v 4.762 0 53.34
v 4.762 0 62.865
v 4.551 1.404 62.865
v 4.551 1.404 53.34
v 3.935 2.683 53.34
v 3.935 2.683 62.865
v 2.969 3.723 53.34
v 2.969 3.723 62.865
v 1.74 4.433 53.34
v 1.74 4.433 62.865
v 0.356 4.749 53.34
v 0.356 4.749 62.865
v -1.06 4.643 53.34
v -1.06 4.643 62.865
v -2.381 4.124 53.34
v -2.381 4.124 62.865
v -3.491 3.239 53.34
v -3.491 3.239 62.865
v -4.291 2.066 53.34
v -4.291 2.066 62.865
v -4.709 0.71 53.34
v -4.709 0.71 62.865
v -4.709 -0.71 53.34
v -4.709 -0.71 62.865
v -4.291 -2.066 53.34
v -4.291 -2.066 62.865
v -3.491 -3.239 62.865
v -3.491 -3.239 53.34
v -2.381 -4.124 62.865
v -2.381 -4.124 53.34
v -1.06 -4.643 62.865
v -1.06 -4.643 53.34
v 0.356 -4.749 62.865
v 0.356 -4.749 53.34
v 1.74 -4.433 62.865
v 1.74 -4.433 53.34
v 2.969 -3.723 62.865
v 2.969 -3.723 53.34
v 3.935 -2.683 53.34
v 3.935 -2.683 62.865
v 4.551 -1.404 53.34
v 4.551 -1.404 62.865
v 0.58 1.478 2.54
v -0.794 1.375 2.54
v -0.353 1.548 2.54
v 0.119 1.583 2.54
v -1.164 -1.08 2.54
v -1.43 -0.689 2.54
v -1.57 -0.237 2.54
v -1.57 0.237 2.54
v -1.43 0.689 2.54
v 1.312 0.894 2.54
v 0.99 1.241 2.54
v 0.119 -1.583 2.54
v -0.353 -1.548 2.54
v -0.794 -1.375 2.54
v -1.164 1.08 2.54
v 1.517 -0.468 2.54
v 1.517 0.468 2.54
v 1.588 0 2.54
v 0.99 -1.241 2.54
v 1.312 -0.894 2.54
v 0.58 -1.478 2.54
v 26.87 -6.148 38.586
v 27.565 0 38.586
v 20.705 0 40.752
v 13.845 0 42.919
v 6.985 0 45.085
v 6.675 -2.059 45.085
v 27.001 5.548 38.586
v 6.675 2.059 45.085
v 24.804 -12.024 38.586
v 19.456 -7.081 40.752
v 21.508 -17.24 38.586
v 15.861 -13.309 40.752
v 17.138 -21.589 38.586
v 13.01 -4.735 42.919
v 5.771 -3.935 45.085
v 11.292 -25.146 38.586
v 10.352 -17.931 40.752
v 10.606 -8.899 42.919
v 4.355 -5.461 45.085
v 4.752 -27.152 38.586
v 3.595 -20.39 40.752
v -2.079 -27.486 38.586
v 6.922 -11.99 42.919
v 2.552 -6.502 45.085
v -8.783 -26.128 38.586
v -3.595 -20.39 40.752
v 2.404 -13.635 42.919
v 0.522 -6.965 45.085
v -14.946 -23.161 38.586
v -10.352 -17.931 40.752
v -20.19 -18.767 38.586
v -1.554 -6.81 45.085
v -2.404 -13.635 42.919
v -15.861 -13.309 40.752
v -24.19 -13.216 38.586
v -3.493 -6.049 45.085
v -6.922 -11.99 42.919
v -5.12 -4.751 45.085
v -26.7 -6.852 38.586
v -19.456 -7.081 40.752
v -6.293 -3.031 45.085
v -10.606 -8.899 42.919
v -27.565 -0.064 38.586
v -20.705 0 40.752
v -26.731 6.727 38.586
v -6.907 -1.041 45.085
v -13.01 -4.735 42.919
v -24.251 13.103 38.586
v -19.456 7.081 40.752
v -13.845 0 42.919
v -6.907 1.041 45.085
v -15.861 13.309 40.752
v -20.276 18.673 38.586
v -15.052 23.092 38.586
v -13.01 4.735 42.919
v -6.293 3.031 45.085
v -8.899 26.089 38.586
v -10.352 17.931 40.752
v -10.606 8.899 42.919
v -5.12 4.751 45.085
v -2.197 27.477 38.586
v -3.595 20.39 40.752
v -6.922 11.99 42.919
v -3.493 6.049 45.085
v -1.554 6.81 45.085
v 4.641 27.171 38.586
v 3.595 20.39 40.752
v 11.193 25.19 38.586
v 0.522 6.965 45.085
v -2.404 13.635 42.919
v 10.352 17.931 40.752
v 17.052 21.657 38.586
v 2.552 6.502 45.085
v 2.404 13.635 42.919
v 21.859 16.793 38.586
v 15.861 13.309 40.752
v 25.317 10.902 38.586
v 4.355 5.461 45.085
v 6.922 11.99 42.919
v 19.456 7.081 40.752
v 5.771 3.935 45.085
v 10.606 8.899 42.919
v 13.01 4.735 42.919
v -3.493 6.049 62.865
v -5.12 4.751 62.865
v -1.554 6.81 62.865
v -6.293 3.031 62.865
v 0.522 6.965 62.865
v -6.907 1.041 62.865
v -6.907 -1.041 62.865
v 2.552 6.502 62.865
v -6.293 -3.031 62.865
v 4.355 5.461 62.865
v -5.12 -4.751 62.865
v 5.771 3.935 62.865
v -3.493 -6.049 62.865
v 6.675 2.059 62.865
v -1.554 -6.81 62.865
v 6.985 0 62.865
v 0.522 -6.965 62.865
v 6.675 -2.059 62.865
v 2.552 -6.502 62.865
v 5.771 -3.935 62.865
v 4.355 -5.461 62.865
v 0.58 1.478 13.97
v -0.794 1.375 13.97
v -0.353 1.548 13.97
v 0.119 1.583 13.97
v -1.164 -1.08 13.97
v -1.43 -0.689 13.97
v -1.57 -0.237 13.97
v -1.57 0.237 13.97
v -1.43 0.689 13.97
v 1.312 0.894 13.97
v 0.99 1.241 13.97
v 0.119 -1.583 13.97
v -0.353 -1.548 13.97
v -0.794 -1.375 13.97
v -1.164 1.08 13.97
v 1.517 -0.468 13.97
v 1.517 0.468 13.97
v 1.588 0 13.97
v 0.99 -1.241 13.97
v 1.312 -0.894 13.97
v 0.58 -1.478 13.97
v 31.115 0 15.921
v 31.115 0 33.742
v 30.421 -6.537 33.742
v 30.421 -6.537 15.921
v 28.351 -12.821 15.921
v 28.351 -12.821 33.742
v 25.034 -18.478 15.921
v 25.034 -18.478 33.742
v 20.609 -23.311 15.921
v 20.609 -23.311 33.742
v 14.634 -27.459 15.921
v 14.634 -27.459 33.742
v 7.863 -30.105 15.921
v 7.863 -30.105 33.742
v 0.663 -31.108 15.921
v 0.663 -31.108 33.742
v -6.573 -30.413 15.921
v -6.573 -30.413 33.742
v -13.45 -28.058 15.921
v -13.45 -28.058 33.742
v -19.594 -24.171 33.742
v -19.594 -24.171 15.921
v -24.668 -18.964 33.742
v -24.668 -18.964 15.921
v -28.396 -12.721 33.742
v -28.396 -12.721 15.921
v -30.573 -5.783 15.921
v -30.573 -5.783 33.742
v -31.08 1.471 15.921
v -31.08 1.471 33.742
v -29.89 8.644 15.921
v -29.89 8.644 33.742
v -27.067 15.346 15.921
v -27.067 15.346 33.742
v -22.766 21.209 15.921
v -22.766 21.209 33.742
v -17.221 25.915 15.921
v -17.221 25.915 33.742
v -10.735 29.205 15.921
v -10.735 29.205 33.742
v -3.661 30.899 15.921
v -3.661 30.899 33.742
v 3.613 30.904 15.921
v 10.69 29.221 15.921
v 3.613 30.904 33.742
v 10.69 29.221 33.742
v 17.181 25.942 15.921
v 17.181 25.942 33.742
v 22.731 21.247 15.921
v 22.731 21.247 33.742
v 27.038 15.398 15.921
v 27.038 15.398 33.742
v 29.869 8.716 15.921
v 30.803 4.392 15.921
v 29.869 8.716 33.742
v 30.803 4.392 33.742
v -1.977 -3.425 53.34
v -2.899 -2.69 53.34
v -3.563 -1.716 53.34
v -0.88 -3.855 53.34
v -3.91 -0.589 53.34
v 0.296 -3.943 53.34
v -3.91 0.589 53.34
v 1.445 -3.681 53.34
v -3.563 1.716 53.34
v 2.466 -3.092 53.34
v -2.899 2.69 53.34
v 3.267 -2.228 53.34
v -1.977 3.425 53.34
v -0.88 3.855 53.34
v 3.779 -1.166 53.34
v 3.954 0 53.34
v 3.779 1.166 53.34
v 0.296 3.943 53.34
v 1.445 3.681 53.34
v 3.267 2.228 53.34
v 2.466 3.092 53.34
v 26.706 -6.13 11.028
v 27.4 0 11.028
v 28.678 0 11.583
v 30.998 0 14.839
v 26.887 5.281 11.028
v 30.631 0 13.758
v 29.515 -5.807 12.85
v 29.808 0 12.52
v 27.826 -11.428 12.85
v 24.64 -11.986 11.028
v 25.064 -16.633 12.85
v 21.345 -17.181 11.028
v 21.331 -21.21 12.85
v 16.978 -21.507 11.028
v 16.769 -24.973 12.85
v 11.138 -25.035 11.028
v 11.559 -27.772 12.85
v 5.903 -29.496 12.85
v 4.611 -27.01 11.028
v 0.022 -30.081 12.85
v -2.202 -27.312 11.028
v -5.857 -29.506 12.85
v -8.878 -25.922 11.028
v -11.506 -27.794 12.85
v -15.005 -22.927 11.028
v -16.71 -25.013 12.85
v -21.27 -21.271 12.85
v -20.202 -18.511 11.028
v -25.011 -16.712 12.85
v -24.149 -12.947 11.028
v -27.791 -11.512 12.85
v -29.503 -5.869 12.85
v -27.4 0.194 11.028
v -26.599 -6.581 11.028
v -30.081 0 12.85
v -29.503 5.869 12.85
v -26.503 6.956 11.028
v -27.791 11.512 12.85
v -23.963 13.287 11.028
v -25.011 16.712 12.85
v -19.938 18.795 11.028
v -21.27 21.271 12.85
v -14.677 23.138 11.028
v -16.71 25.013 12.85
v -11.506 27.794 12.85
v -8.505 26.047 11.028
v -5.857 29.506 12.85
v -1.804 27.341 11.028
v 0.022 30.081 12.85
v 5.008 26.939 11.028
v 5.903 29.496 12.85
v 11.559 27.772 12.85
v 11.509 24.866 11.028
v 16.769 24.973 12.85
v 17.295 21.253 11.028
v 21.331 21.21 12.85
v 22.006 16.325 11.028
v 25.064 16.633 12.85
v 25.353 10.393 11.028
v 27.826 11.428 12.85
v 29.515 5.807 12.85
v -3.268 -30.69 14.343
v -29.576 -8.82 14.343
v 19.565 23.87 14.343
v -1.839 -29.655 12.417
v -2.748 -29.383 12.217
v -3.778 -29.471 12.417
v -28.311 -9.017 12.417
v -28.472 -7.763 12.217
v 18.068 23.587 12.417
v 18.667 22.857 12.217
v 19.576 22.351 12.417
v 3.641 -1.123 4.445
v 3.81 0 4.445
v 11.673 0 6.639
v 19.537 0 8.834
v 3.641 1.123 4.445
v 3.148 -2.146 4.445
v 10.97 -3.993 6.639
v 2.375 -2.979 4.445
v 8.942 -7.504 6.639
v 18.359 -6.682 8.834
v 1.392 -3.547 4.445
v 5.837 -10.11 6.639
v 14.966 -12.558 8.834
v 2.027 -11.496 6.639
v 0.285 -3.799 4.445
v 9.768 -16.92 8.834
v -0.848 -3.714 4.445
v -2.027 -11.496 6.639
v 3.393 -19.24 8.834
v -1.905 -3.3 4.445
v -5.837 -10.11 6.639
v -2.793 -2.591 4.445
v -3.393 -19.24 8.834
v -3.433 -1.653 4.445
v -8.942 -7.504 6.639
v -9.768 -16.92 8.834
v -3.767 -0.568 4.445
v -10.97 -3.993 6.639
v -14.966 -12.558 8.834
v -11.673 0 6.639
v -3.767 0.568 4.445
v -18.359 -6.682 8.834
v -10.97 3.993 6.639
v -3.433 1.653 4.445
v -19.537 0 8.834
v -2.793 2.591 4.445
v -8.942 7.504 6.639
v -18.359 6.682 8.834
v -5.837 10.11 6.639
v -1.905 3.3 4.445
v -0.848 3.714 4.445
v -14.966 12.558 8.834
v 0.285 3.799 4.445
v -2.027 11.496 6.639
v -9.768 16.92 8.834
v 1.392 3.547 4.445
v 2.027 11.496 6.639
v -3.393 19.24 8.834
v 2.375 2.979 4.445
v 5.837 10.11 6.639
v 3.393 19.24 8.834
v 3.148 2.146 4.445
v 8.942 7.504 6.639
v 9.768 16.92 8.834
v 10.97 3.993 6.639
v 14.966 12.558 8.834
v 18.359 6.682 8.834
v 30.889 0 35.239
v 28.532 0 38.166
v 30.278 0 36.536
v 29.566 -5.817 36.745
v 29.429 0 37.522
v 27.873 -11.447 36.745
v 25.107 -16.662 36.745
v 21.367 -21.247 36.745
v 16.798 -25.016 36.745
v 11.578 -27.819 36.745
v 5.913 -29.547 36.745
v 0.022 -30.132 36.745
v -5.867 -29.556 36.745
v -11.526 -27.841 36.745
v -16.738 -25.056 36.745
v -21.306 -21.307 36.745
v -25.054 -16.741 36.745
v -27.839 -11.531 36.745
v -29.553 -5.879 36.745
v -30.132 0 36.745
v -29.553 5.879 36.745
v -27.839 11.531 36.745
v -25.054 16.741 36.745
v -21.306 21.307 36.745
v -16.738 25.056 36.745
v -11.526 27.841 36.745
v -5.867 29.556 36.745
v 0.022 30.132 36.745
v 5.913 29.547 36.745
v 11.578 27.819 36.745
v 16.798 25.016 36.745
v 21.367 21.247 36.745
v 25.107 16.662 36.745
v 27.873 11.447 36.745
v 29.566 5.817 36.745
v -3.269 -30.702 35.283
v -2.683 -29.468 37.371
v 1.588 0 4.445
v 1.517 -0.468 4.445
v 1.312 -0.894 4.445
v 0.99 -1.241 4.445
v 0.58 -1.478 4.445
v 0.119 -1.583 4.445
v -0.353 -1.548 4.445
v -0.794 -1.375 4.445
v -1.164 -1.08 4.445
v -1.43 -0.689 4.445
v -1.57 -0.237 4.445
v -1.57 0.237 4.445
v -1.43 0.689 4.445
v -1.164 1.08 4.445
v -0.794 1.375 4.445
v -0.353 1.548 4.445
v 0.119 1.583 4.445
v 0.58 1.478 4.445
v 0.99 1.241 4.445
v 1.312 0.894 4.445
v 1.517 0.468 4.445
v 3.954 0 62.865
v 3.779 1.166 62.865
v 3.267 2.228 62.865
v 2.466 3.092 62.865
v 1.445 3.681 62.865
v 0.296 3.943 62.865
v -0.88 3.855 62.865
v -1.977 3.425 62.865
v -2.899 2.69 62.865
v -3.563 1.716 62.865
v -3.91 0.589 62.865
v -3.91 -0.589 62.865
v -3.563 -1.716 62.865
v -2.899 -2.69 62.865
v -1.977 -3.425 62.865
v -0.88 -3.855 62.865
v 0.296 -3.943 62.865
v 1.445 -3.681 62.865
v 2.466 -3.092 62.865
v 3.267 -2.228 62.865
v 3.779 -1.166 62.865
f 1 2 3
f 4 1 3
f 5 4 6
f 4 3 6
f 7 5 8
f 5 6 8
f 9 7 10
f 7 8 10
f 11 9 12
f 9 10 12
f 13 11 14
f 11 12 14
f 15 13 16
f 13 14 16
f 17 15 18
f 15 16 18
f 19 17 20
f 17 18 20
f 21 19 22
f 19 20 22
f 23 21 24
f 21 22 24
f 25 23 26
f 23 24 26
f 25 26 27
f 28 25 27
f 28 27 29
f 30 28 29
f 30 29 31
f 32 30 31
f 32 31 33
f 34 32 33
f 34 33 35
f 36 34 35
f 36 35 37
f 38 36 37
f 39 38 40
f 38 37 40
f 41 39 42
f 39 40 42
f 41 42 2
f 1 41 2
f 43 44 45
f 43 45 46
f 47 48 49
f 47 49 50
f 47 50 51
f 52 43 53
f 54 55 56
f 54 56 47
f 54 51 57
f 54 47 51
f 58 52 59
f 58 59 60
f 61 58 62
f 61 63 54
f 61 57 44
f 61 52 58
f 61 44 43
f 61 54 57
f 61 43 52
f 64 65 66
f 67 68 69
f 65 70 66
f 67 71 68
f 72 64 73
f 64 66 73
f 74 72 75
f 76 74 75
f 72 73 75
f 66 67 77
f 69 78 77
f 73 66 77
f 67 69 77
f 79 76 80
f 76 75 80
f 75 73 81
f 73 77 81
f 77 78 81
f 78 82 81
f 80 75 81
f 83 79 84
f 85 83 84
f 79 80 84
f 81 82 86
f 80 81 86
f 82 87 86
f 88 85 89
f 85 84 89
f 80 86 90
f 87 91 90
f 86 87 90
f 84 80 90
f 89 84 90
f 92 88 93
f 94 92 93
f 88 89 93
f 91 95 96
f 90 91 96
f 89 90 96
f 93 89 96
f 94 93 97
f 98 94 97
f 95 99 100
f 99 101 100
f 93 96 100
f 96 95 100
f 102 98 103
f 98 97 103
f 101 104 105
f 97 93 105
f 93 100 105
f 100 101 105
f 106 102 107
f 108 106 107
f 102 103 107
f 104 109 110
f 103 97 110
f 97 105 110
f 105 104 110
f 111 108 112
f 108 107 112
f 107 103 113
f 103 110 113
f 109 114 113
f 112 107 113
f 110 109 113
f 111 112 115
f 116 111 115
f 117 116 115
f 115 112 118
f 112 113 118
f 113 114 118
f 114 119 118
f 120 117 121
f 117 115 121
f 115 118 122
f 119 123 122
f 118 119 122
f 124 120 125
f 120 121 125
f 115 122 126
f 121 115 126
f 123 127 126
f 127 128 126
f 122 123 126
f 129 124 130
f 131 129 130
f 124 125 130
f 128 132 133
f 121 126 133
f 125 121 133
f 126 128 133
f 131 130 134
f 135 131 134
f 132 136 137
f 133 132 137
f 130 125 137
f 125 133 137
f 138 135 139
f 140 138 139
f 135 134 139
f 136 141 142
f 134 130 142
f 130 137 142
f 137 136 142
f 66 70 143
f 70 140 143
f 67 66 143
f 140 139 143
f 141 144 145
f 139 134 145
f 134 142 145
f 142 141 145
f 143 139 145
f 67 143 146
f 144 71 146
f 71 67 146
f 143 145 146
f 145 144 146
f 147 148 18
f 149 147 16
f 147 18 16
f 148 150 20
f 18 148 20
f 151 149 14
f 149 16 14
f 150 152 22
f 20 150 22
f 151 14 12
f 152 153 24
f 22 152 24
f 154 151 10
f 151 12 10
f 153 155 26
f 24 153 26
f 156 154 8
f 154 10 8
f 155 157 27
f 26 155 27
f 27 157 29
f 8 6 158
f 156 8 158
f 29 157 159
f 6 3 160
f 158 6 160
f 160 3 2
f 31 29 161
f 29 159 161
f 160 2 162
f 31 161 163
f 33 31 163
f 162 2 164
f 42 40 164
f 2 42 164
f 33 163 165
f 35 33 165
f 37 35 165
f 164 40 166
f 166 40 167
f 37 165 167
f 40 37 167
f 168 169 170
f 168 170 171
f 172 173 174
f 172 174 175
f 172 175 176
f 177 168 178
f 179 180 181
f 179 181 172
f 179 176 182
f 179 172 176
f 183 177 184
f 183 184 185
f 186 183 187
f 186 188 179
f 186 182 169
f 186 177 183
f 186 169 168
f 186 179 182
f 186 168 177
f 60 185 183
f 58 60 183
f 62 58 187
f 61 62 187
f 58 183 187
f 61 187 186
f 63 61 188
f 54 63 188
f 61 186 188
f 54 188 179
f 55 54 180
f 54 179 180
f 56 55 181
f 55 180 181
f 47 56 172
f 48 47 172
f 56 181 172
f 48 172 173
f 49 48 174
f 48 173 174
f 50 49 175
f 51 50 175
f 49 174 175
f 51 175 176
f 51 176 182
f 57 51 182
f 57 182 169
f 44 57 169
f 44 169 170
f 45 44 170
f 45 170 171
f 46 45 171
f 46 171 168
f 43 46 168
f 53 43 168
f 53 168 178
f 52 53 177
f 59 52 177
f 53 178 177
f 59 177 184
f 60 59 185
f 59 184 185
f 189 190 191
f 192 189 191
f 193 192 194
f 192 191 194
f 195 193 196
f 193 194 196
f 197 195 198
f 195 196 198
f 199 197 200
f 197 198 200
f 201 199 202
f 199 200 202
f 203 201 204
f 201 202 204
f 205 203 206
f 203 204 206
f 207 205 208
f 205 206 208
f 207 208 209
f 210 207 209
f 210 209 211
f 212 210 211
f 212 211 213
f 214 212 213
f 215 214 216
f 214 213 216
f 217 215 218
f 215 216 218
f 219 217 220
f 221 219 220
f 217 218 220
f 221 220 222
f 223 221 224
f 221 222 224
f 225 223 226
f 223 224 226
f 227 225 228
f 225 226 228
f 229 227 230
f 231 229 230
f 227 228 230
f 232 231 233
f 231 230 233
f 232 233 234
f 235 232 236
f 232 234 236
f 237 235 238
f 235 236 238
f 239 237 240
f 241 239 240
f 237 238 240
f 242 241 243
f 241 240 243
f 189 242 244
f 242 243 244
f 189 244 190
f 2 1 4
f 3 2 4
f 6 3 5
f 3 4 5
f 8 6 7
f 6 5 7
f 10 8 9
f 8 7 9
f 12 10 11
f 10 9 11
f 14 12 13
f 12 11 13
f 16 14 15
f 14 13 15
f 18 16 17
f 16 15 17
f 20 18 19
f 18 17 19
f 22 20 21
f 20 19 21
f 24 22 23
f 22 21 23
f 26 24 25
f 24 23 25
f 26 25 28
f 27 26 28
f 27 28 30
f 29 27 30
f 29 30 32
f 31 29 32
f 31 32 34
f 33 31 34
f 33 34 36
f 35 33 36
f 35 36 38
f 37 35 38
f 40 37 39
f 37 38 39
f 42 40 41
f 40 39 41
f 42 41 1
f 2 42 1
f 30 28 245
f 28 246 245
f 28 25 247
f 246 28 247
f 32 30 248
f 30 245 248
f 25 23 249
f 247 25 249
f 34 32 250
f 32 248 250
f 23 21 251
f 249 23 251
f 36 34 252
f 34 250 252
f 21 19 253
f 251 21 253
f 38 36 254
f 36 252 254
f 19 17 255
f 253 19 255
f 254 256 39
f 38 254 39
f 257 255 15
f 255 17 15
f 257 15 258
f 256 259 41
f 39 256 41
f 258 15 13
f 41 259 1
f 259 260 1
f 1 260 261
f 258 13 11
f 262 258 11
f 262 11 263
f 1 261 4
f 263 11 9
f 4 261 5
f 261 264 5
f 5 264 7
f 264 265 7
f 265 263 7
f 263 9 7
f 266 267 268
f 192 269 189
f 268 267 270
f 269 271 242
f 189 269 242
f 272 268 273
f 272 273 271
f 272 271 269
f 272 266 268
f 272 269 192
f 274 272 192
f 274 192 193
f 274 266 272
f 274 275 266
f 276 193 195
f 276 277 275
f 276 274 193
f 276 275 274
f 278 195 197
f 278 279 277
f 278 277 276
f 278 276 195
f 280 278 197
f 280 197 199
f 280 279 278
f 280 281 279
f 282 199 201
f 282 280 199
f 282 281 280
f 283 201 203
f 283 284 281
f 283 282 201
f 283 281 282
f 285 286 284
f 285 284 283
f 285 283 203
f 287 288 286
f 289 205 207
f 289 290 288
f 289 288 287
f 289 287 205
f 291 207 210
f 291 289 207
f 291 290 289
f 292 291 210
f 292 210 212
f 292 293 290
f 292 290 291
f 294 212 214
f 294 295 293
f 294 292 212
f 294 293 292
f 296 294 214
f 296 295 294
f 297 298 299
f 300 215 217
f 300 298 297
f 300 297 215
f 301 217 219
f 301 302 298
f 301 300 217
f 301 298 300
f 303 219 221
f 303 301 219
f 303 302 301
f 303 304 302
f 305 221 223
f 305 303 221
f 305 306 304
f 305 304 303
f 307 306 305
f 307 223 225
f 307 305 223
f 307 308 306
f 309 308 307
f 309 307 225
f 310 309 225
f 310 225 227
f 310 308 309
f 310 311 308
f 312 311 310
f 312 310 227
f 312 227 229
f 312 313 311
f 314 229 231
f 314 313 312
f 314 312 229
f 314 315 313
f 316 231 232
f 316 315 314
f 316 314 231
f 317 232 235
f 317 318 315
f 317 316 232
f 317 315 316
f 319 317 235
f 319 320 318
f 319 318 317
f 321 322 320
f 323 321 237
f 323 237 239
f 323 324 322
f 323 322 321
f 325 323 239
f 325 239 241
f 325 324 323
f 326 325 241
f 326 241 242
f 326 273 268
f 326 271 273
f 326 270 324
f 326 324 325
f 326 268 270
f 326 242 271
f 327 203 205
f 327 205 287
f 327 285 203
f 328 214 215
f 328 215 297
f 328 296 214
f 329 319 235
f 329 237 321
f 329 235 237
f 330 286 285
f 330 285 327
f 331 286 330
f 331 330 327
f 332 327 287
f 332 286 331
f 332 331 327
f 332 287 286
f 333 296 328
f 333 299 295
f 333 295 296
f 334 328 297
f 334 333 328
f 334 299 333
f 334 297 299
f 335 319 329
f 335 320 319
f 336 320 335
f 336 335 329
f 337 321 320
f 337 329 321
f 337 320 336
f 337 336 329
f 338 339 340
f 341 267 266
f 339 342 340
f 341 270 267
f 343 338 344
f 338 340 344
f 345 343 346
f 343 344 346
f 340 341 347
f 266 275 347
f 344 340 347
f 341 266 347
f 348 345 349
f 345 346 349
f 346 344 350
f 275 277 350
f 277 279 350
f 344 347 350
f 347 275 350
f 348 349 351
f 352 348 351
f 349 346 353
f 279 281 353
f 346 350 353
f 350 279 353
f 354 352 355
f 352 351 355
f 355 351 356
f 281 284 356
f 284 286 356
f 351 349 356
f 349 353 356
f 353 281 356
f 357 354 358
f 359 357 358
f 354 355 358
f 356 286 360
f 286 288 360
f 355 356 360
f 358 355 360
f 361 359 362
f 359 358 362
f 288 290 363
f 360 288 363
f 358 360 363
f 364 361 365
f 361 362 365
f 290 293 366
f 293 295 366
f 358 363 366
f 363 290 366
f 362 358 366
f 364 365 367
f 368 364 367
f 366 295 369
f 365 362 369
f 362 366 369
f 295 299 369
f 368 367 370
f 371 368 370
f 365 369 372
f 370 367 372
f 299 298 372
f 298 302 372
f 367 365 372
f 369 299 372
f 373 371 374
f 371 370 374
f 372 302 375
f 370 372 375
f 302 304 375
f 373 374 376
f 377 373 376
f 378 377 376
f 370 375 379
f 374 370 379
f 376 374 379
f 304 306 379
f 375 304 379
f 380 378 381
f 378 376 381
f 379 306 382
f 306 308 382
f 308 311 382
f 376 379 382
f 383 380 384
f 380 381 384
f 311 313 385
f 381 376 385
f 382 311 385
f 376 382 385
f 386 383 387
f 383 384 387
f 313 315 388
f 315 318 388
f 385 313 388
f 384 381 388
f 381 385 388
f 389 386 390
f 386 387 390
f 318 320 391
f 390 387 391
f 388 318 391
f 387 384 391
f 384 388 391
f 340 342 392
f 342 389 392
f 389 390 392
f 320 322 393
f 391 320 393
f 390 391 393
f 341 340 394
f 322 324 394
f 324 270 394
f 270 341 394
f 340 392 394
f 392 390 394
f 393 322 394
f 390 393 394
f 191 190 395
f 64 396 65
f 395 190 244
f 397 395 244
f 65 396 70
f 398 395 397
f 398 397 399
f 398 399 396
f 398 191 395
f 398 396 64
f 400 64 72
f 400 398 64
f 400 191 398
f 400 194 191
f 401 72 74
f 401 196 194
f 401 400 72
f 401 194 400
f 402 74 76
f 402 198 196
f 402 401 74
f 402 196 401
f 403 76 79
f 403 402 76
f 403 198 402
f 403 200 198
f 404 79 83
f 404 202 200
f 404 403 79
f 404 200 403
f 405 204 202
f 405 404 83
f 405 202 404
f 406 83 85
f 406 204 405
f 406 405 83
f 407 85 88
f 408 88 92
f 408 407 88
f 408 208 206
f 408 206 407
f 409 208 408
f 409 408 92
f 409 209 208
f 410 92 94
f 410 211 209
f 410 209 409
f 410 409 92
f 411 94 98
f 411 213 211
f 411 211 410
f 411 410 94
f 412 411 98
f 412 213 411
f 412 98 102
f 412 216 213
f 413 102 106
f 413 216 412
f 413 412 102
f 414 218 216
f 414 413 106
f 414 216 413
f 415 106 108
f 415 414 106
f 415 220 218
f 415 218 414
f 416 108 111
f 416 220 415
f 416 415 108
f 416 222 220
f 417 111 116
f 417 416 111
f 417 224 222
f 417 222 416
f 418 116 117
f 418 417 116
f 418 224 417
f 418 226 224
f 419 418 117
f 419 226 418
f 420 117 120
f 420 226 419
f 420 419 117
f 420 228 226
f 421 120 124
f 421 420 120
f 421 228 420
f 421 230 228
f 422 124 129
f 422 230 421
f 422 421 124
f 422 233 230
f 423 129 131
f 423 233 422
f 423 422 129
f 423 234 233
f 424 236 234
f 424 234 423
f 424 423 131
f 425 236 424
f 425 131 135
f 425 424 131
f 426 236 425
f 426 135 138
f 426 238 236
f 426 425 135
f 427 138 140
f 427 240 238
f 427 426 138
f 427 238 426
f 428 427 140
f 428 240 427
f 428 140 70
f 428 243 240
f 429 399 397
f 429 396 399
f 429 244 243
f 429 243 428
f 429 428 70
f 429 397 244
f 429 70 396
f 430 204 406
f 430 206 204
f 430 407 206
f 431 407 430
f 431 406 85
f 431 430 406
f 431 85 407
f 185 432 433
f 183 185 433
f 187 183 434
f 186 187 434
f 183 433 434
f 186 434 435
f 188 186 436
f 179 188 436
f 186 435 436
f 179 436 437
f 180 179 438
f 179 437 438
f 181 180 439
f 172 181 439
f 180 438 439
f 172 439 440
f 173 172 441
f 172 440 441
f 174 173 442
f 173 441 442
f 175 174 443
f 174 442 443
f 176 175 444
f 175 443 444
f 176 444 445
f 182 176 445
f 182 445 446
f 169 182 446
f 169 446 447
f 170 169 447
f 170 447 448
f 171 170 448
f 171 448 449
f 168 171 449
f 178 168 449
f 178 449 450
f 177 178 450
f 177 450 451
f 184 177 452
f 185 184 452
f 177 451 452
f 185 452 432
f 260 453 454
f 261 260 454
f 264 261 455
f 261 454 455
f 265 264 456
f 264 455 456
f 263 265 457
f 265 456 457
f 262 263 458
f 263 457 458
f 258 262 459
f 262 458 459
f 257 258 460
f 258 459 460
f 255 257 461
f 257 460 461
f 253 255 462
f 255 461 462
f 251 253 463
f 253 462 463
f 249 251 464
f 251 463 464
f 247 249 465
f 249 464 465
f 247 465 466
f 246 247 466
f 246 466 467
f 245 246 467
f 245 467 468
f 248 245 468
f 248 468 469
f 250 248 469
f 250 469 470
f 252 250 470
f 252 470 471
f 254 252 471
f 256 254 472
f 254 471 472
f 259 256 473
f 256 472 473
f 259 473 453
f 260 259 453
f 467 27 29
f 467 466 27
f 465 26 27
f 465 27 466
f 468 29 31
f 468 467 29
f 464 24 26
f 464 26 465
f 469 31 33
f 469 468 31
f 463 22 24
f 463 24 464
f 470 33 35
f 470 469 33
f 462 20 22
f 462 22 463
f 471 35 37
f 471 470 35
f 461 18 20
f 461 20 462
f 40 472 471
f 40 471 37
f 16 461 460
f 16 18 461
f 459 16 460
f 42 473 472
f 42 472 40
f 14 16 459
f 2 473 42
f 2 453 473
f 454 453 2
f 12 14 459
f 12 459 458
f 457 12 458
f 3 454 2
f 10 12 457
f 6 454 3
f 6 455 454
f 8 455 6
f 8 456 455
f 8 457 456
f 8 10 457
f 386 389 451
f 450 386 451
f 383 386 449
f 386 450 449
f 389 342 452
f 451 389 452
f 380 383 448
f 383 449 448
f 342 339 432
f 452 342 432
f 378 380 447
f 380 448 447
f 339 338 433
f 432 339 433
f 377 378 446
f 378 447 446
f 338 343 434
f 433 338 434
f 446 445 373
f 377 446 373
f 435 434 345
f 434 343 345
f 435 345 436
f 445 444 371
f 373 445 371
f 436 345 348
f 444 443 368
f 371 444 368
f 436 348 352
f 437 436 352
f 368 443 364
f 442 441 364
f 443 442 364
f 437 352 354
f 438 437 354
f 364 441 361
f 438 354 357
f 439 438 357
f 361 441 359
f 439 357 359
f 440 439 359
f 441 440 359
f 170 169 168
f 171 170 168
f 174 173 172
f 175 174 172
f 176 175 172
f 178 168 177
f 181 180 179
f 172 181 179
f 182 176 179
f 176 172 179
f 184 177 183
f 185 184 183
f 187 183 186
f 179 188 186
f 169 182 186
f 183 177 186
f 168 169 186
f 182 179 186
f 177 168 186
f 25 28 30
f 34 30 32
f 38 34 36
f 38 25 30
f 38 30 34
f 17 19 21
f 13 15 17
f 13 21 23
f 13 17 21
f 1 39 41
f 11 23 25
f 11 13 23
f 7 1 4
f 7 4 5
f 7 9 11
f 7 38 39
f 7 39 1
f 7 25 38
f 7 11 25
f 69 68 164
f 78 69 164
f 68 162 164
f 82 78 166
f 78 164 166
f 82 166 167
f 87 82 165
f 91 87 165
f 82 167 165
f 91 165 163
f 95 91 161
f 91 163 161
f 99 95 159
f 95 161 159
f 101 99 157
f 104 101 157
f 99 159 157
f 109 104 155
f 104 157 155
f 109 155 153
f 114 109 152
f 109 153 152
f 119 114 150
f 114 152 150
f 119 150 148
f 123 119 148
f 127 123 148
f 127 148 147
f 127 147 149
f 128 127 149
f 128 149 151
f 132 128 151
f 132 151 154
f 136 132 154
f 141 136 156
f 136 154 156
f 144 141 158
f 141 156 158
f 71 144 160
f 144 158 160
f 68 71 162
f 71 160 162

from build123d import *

# Parameters (mm, degrees)
F2_R      = 4.7625
F3_DEPTH  = 9.525
F4_R      = 1.5875
F5_DEPTH  = 9.525
F3_FACE_R = 4.7625
F6_DEPTH  = 9.525
F7_R      = 3.954416
F8_DEPTH  = 9.525
F5_FACE_R = 1.5875
F9_DEPTH  = 11.43
F10_R     = 5.08


with BuildPart() as f1:
    # F0 (on Front) → F1 (revolve)
    with BuildSketch(Plane.XZ):
        Polygon((3.81, 4.445), (31.115, 12.065), (31.115, 37.465), (6.985, 45.085), (6.985, 62.865), (0, 62.865), (0, 4.445), align=None)
    revolve(axis=Axis((0, 0, 33.655), (0, 0, -1)))

    # F2 (on face) → F3 (cut)
    with BuildSketch(Plane.XY.offset(62.865)):
        Circle(F2_R)
    extrude(amount=-F3_DEPTH, mode=Mode.SUBTRACT)

    # F4 (on face) → F5 (cut)
    with BuildSketch(Plane(origin=(0, 0, 4.445), x_dir=(1, 0, 0), z_dir=(0, 0, -1))):
        Circle(F4_R)
    extrude(amount=-F5_DEPTH, mode=Mode.SUBTRACT)

    # F10
    f10_edges = [f1.edges().sort_by_distance(p)[0] for p in [
        (-31.115, 0, 12.065),
        (-31.115, 0, 37.465),
        (31.115, 0, 24.765),
    ]]
    fillet(f10_edges, radius=F10_R)


with BuildPart() as f6:
    # F3_face (on face) → F6 (new body)
    with BuildSketch(Plane.XY.offset(53.34)):
        Circle(F3_FACE_R)
    extrude(amount=F6_DEPTH)

    # F7 (on face) → F8 (cut)
    with BuildSketch(Plane.XY.offset(62.865)):
        Circle(F7_R)
    extrude(amount=-F8_DEPTH, mode=Mode.SUBTRACT)


with BuildPart() as f9:
    # F5_face (on face) → F9 (new body)
    with BuildSketch(Plane(origin=(0, 0, 13.97), x_dir=(1, 0, 0), z_dir=(0, 0, -1))):
        Circle(F5_FACE_R)
    extrude(amount=F9_DEPTH)


solid = Compound([f1.part, f6.part, f9.part])
